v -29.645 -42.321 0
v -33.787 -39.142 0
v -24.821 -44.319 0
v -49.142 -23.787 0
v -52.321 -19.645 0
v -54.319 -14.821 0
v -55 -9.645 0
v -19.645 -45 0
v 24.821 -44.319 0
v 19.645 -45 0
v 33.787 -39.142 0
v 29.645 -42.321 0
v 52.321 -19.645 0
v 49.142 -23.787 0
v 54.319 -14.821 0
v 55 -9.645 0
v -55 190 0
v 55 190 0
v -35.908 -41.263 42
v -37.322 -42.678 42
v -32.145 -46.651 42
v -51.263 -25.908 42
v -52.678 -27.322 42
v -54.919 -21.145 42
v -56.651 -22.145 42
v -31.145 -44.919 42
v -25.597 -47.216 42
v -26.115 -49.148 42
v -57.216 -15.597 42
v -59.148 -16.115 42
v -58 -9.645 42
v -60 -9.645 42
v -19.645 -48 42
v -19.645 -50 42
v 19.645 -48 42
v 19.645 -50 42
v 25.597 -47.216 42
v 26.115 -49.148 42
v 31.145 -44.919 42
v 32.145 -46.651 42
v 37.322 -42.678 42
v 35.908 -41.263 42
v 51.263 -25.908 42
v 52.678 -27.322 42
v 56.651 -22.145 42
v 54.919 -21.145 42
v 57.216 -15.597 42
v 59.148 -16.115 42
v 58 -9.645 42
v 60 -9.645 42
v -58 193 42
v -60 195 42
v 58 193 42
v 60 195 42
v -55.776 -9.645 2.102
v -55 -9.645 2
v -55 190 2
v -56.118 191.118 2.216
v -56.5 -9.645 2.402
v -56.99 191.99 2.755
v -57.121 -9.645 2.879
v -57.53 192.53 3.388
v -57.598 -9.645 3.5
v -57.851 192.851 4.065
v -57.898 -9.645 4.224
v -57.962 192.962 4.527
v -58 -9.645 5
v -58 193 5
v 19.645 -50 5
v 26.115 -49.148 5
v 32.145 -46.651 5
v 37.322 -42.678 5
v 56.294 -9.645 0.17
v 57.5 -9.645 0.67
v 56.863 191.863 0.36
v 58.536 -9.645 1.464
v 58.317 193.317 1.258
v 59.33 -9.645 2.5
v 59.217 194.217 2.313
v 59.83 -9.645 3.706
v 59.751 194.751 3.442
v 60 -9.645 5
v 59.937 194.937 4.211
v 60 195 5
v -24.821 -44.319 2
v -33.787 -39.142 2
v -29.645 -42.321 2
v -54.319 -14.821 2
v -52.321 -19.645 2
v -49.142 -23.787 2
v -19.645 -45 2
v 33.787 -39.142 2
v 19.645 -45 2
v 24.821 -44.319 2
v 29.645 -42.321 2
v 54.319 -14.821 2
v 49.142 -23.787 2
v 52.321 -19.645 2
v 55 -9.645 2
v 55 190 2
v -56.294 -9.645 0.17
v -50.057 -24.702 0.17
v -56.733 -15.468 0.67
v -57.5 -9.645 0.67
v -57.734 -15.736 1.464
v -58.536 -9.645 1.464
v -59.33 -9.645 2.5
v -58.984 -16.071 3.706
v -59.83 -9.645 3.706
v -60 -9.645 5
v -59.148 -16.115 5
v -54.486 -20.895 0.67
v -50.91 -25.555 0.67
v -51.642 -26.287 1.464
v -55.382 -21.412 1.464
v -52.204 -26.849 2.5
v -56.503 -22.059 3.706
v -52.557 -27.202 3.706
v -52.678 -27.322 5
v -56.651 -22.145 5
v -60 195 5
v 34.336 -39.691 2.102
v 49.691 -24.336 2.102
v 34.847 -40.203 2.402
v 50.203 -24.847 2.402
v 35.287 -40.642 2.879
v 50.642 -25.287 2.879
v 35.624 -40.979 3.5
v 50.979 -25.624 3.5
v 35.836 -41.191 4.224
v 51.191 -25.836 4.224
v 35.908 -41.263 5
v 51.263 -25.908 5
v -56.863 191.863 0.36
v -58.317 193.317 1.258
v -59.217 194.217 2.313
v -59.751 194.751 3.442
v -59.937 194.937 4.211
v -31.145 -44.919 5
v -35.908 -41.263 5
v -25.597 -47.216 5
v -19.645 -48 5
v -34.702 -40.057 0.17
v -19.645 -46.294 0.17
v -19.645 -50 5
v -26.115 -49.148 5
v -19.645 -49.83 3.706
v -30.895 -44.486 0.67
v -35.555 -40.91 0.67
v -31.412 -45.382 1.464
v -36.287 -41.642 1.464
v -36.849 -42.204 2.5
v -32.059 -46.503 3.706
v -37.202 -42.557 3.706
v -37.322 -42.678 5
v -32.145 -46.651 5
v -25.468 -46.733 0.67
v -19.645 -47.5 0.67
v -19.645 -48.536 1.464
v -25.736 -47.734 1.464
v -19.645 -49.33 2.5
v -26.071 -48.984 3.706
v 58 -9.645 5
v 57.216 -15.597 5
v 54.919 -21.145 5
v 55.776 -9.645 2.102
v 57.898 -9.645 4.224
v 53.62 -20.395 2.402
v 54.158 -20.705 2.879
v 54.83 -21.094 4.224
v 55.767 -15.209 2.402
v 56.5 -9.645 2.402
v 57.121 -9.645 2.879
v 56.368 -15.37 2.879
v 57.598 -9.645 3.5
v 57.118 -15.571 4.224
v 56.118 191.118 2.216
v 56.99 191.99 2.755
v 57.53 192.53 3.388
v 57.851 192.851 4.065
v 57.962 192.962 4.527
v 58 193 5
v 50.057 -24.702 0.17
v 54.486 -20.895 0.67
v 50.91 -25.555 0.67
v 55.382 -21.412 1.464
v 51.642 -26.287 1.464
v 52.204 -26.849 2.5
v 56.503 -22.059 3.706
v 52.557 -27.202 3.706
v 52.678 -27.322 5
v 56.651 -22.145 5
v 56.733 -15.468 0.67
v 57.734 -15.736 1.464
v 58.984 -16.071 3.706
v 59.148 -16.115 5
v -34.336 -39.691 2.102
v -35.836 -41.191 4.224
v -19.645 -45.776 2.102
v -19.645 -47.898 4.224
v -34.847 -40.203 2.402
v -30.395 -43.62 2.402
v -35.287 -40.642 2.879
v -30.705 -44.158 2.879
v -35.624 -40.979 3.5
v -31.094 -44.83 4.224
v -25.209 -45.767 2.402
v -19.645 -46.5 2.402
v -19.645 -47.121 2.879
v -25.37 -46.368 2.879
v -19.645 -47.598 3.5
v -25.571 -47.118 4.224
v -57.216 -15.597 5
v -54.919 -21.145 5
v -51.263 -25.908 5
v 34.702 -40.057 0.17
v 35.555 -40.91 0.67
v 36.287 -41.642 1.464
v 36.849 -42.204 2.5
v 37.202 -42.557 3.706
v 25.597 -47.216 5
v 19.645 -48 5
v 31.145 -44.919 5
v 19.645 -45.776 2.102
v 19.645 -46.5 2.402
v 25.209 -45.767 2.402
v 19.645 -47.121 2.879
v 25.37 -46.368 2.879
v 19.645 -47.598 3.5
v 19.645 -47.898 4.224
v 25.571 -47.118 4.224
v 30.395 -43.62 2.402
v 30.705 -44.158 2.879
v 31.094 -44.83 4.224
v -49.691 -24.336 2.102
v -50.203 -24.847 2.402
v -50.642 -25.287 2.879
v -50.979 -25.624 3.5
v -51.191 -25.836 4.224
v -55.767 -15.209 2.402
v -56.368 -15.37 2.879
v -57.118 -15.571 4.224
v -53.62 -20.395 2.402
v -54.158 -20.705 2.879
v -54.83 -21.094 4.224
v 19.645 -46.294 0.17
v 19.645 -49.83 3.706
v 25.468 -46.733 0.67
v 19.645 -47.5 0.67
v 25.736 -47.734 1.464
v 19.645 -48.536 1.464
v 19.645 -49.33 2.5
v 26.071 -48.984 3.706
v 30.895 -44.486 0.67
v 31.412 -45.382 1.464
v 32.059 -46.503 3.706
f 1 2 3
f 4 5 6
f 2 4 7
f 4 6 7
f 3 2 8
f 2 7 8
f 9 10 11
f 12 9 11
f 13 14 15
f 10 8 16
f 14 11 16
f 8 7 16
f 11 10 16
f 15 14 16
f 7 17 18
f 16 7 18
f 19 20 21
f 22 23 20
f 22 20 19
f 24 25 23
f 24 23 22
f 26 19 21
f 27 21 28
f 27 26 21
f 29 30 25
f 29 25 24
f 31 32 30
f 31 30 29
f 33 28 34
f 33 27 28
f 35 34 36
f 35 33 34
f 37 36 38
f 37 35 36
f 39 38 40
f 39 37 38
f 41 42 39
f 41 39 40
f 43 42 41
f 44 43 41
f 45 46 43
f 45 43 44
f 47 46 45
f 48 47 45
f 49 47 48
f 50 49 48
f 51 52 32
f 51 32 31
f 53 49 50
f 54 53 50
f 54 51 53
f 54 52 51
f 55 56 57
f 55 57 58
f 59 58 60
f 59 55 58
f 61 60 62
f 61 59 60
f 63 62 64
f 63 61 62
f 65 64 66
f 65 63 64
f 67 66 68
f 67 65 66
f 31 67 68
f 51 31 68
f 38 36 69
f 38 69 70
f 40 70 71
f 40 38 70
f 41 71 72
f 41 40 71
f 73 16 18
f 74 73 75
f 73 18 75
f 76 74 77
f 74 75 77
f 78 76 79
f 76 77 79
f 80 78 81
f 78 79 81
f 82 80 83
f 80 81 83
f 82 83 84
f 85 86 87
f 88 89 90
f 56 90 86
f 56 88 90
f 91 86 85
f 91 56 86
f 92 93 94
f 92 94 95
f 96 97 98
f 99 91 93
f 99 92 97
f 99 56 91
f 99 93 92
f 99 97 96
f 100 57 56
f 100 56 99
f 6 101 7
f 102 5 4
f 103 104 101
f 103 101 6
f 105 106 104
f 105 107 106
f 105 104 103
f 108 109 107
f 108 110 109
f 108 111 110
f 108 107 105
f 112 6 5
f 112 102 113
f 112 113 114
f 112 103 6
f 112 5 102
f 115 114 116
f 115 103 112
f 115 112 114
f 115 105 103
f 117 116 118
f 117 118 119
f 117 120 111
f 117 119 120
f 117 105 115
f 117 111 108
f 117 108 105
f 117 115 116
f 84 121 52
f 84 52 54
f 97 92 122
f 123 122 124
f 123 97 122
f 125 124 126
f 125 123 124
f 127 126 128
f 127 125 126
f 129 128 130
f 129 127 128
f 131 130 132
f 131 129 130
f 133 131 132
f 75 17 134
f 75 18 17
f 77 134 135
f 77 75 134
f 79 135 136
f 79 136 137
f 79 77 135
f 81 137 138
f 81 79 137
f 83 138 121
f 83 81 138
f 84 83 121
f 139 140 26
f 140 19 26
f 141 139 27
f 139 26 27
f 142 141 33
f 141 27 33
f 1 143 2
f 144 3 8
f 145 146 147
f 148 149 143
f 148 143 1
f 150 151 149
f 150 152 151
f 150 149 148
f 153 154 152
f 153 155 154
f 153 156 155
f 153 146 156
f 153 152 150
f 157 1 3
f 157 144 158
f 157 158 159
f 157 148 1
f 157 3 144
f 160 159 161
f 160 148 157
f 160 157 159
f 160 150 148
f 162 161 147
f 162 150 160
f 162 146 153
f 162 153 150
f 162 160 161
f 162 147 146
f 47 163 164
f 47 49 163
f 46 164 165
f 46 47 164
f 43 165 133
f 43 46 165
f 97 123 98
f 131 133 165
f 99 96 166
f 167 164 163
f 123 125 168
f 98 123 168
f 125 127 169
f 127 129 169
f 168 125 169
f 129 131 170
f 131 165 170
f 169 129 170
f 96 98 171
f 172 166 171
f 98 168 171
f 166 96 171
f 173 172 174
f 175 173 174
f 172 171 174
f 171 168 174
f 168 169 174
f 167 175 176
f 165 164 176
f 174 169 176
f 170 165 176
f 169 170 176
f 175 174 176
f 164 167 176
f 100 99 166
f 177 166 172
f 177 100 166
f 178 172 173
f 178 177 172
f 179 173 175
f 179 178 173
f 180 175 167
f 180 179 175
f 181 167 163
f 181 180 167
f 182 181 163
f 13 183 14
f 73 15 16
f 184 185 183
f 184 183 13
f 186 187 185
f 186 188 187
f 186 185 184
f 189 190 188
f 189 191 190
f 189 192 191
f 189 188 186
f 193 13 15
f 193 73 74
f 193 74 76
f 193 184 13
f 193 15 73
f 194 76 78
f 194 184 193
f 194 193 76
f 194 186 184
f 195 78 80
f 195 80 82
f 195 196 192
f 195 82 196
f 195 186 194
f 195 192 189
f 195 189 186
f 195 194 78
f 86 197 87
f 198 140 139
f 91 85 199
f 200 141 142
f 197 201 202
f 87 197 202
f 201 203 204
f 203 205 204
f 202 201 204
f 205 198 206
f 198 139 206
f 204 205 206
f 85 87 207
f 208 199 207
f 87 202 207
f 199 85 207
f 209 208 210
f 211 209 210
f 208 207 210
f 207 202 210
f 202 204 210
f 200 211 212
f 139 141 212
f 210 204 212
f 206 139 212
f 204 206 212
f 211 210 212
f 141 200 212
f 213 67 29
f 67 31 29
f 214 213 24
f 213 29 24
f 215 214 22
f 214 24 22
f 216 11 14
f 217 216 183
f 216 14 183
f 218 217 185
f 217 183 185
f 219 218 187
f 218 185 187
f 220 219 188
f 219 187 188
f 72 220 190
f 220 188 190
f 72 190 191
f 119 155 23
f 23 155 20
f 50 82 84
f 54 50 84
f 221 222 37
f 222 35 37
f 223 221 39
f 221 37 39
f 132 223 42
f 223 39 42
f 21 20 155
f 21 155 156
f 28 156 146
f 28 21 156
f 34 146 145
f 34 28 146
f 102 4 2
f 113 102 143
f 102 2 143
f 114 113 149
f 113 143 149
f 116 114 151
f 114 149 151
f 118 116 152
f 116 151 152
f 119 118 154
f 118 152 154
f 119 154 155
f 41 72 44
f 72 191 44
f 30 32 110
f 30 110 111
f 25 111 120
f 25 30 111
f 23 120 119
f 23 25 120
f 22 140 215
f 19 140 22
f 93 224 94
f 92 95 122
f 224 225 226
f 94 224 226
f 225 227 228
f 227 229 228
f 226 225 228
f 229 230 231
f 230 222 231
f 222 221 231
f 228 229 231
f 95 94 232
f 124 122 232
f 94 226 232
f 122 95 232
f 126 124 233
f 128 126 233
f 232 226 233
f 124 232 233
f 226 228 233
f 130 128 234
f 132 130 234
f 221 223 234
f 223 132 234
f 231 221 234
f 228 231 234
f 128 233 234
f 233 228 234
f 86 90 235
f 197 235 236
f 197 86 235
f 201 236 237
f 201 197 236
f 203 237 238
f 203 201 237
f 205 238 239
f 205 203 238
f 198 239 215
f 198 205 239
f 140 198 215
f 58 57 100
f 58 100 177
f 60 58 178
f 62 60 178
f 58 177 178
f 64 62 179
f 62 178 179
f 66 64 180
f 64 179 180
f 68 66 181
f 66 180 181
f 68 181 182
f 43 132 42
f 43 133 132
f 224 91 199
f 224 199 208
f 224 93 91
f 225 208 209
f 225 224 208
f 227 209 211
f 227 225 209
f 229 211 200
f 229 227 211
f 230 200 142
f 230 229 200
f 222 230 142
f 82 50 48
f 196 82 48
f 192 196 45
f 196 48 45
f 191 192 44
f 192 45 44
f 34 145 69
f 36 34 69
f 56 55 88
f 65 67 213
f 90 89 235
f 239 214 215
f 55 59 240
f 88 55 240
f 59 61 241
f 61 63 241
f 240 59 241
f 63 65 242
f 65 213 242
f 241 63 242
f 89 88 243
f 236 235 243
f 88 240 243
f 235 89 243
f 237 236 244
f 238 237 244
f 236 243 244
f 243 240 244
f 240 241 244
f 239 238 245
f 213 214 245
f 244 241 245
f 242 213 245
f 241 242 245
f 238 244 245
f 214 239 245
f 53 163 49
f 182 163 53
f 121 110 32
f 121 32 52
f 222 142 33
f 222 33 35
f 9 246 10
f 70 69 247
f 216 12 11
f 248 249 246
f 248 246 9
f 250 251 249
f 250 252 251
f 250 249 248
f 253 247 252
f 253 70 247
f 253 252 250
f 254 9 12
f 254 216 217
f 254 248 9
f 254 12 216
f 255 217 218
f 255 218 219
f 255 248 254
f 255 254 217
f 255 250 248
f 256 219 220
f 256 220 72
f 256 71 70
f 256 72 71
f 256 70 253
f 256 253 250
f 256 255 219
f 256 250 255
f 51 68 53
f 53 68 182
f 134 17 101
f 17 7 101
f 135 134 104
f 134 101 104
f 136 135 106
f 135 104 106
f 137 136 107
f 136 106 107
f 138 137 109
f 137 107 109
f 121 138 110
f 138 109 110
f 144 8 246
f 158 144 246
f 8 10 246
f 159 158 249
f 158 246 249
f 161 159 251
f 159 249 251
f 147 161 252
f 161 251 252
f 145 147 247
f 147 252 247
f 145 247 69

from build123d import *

# Parameters (mm, degrees)
SKETCH1_W           = 120
SKETCH1_H           = 245
BOSS_EXTRUDE1_DEPTH = 42
CHAMFER1_SIZE       = 30
FILLET3_R           = 25
FILLET1_R           = 5
SHELL1_T            = -2


with BuildPart() as part:
    # Sketch1 → Boss-Extrude1 (new body)
    with BuildSketch(Plane.XY):
        with Locations((0, 72.5)):
            Rectangle(SKETCH1_W, SKETCH1_H)
    extrude(amount=BOSS_EXTRUDE1_DEPTH)

    # Chamfer1
    chamfer1_edges = [part.edges().sort_by_distance(p)[0] for p in [
        (60, -50, 21),
        (-60, -50, 21),
    ]]
    chamfer(chamfer1_edges, length=CHAMFER1_SIZE)

    # Fillet3
    fillet3_edges = [part.edges().sort_by_distance(p)[0] for p in [
        (30, -50, 21),
        (-30, -50, 21),
        (-60, -20, 21),
        (60, -20, 21),
    ]]
    fillet(fillet3_edges, radius=FILLET3_R)

    # Fillet1
    fillet1_edges = [part.edges().sort_by_distance(p)[0] for p in [
        (-45, -35, 0),
        (0, -50, 0),
        (60, 92.67766953, 0),
        (45, -35, 0),
        (58.096988313, -19.21174675, 0),
        (29.21174675, -48.096988313, 0),
        (-29.21174675, -48.096988313, 0),
        (-58.096988313, -19.21174675, 0),
        (0, 195, 0),
        (-60, 92.67766953, 0),
    ]]
    fillet(fillet1_edges, radius=FILLET1_R)

    # Shell1
    shell1_openings = [part.faces().sort_by_distance(p)[0] for p in [
        (0, 76.260599265, 42),
    ]]
    offset(amount=SHELL1_T, openings=shell1_openings)


solid = part.part
